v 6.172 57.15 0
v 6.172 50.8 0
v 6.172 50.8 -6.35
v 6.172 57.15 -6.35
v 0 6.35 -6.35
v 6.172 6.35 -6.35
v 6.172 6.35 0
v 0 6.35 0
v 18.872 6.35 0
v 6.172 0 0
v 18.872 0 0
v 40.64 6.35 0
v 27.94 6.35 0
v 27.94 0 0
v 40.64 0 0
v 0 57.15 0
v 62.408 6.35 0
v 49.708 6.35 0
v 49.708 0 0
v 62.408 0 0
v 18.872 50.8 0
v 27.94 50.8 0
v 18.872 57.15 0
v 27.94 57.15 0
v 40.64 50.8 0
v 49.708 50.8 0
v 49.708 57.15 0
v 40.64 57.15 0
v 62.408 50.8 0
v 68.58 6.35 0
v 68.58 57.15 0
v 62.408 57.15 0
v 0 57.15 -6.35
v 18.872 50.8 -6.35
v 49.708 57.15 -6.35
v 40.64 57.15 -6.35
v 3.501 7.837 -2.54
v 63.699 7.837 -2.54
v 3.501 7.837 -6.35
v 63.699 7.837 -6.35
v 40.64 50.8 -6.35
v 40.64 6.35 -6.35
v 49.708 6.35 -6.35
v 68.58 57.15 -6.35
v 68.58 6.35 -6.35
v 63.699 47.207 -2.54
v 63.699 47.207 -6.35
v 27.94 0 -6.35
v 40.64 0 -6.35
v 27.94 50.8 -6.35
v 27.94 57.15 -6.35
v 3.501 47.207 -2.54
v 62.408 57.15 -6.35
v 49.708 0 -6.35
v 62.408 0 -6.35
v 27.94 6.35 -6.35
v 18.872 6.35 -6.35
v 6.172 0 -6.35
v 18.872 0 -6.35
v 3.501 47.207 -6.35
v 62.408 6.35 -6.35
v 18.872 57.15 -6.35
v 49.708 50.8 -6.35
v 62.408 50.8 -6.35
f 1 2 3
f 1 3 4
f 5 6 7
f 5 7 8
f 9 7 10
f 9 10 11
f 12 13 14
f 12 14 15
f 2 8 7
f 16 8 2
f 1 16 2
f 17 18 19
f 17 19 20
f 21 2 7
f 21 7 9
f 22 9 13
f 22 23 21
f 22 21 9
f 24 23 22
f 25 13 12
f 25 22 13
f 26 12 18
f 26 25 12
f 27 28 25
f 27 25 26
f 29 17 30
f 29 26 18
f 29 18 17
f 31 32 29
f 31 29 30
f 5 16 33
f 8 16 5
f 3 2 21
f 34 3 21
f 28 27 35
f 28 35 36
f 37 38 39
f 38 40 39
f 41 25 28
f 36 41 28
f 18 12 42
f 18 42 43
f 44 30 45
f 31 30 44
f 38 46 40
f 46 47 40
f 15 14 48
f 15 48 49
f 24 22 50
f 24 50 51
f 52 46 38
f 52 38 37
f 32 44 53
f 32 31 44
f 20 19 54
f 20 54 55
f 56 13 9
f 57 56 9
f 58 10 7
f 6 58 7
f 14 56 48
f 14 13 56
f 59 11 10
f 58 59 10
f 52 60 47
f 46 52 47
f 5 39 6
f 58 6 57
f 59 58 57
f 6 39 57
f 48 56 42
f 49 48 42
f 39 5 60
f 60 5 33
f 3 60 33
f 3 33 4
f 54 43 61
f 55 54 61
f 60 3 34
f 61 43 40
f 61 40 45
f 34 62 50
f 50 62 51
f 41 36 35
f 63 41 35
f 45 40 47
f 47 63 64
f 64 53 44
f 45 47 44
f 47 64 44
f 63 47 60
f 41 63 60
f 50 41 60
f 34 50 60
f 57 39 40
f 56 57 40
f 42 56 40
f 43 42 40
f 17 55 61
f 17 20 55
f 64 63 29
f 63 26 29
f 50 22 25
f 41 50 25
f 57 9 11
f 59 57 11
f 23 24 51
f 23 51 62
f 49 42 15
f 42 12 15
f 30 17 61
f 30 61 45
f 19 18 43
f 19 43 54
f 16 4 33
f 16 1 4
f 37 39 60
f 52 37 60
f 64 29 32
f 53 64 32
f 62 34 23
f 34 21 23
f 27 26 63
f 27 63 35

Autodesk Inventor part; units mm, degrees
ref_plane "YZ Plane" through (0, 0, 0) normal (1, 0, 0) x (0, 1, 0)
ref_plane "XZ Plane" through (0, 0, 0) normal (0, 1, 0) x (-1, 0, 0)
ref_plane "XY Plane" through (0, 0, 0) normal (0, 0, 1) x (1, 0, 0)
sketch "Sketch1" plane through (0, 0, 0) normal (0, 0, 1) x (1, 0, 0)
  line L0 (68.58, 6.35) -> (68.58, 57.15)
  line L1 (68.58, 57.15) -> (0, 57.15)
  line L2 (0, 57.15) -> (0, 6.35)
  line L3 (40.64, 6.35) -> (40.64, 0)
  line L4 (27.94, 6.35) -> (27.94, 0)
  line L5 (27.94, 0) -> (40.64, 0)
  line L6 (27.94, 6.35) -> (18.8722, 6.35)
  line L7 (18.8722, 6.35) -> (18.8722, 0)
  line L8 (18.8722, 0) -> (6.1722, 0)
  line L9 (6.1722, 0) -> (6.1722, 6.35)
  line L10 (40.64, 6.35) -> (49.7078, 6.35)
  line L11 (49.7078, 6.35) -> (49.7078, 0)
  line L12 (49.7078, 0) -> (62.4078, 0)
  line L13 (62.4078, 0) -> (62.4078, 6.35)
  line L14 (6.1722, 0) -> (18.8722, 0)
  line L15 (27.94, 0) -> (40.64, 0)
  line L16 (49.7078, 0) -> (62.4078, 0)
  line L17 (27.94, 6.35) -> (18.8722, 6.35)
  line L18 (6.1722, 6.35) -> (0, 6.35)
  line L19 (40.64, 6.35) -> (49.7078, 6.35)
  line L20 (62.4078, 6.35) -> (68.58, 6.35)
  point P0 (0, 0)
  dimension "d0" = 68.58
  dimension "d1" = 50.8
extrude "Extrusion1" add sketch "Sketch1" against normal blind 6.35
sketch "Sketch2" plane through (0, 0, 0) normal (0, 0, 1) x (1, 0, 0)
  line L0 (0, 6.35) -> (6.1722, 6.35) projected
  line L1 (6.1722, 50.8) -> (6.1722, 57.15)
  line L2 (0, 57.15) -> (68.58, 57.15) projected
  line L3 (49.7078, 6.35) -> (40.64, 6.35) projected
  line L4 (40.64, 50.8) -> (40.64, 57.15)
  line L5 (18.8722, 0) -> (18.8722, 6.35) projected
  line L6 (18.8722, 50.8) -> (18.8722, 57.15)
  line L7 (27.94, 0) -> (27.94, 6.35) projected
  line L8 (27.94, 50.8) -> (27.94, 57.15)
  line L9 (49.7078, 50.8) -> (49.7078, 57.15)
  line L10 (68.58, 6.35) -> (62.4078, 6.35) projected
  line L11 (62.4078, 50.8) -> (62.4078, 57.15)
  line L12 (0, 57.15) -> (0, 50.8)
  line L13 (68.58, 57.15) -> (68.58, 6.35) projected
  line L14 (49.7078, 50.8) -> (62.4078, 50.8)
  line L15 (6.1722, 50.8) -> (18.8722, 50.8)
  line L16 (27.94, 50.8) -> (40.64, 50.8)
  line L17 (27.94, 57.15) -> (40.64, 57.15)
  point P0 (0, 0)
extrude "Extrusion2" cut sketch "Sketch2" against normal blind 6.35
sketch "Sketch3" plane through (0, 0, -6.35) normal (0, 0, -1) x (-1, 0, 0)
  line L0 (-63.699, 7.8373) -> (-3.501, 7.8373)
  line L1 (-3.501, 7.8373) -> (-3.501, 47.2073)
  line L2 (-3.501, 47.2073) -> (-63.699, 47.2073)
  line L3 (-63.699, 47.2073) -> (-63.699, 7.8373)
  point P0 (0, 0)
  dimension "d15" = 60.198
  dimension "d16" = 39.37
extrude "Extrusion3" cut sketch "Sketch3" against normal blind 3.81
properties part number "front-flat"
